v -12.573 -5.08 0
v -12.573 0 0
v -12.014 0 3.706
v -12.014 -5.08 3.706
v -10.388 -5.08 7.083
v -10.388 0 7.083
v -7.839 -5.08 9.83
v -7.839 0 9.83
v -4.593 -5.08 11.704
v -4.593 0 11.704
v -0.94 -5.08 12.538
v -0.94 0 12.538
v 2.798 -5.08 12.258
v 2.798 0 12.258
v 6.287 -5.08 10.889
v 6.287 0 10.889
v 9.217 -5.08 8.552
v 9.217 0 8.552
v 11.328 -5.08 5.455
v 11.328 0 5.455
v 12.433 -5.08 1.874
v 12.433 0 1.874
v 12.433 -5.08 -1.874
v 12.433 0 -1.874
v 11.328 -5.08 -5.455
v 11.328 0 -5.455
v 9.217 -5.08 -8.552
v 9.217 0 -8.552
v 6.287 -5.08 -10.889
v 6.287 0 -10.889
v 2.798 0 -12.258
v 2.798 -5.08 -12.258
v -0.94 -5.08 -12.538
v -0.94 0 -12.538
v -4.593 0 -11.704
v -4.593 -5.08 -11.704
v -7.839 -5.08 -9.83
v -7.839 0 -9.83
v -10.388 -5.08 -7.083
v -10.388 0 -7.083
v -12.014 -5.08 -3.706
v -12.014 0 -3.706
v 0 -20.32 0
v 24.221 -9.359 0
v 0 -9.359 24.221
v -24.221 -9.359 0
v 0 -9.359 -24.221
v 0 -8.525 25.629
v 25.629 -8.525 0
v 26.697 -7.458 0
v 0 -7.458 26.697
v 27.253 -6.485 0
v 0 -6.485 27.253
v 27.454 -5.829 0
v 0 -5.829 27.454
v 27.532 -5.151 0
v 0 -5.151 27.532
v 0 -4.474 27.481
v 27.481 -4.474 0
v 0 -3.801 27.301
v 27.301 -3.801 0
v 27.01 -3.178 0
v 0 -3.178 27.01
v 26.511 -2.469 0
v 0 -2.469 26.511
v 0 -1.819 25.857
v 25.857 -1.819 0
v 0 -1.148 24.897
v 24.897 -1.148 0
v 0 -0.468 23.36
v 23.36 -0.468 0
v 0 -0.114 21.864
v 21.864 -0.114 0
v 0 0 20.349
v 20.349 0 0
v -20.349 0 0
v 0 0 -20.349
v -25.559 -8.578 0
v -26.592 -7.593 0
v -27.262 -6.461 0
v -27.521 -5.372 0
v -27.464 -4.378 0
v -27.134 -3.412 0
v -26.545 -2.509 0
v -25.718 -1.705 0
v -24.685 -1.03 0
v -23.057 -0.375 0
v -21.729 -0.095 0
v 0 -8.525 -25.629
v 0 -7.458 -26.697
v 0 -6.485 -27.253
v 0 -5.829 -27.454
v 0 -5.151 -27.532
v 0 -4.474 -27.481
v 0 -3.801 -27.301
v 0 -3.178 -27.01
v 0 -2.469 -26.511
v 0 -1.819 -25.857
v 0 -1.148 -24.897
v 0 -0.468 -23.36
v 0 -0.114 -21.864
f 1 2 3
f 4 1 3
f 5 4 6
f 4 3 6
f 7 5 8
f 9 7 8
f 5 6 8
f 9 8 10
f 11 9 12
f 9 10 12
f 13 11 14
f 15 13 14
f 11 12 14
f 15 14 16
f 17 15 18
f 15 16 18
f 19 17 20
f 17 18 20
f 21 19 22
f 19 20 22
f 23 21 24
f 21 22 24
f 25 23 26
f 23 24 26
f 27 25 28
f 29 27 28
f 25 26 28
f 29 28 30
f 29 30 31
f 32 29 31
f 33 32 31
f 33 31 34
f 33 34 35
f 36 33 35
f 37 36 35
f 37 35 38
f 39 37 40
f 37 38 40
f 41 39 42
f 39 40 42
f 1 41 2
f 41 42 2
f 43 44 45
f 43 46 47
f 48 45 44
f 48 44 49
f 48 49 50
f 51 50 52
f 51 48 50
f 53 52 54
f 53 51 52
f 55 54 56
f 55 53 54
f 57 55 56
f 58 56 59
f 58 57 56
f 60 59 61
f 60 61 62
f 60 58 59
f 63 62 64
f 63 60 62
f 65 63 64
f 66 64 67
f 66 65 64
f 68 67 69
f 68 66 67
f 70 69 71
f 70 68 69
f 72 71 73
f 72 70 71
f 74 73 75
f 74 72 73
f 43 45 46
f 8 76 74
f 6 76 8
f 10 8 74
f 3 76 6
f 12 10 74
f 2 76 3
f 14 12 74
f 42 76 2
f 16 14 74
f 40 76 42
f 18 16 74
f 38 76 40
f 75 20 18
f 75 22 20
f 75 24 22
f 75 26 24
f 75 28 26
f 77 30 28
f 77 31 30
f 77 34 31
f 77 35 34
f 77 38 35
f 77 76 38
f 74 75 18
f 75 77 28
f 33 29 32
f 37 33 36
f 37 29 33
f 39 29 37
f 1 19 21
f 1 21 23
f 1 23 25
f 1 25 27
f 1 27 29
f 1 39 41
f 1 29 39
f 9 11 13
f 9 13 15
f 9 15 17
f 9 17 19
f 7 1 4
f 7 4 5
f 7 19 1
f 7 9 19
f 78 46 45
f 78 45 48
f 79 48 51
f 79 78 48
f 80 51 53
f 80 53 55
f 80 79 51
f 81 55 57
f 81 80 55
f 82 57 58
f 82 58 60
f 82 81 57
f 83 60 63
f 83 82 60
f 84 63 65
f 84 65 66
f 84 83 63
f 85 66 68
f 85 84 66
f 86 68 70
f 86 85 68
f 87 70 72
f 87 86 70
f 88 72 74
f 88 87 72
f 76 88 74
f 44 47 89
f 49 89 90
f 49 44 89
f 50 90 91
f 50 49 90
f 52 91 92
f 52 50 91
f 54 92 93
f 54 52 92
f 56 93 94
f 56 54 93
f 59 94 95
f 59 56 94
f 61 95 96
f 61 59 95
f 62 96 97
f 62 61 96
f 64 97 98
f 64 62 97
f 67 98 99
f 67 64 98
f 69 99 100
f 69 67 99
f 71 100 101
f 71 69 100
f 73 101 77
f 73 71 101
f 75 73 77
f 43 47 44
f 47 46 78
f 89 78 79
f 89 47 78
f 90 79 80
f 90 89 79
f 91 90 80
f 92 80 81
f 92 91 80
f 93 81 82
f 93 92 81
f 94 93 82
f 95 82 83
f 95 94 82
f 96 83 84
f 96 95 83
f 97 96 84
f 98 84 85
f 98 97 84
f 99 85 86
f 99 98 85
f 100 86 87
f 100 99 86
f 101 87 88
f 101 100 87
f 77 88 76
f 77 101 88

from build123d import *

# Parameters (mm, degrees)
F3_R     = 5.08
F4_R     = 12.573
F5_DEPTH = 5.08


with BuildPart() as f2:
    # F0 (on Front) → F2 section 0
    with BuildSketch(Plane.XZ, mode=Mode.PRIVATE) as f2_s0:
        Polygon((-44.901281, 0), (0, -44.901281), (44.901281, 0), (0, 44.901281), align=None)
    loft([f2_s0.sketch, Vertex(0, -20.32, 0)])

    # F3
    f3_edges = [f2.edges().sort_by_distance(p)[0] for p in [
        (-22.45064, 0, -22.45064),
        (22.45064, 0, -22.45064),
        (22.45064, 0, 22.45064),
        (-22.45064, 0, 22.45064),
    ]]
    fillet(f3_edges, radius=F3_R)

    # F4 (on face) → F5 (cut)
    with BuildSketch(Plane(origin=(0, 0, 0), x_dir=(-1, 0, 0), z_dir=(0, 1, 0))):
        Circle(F4_R)
    extrude(amount=-F5_DEPTH, mode=Mode.SUBTRACT)


solid = f2.part
